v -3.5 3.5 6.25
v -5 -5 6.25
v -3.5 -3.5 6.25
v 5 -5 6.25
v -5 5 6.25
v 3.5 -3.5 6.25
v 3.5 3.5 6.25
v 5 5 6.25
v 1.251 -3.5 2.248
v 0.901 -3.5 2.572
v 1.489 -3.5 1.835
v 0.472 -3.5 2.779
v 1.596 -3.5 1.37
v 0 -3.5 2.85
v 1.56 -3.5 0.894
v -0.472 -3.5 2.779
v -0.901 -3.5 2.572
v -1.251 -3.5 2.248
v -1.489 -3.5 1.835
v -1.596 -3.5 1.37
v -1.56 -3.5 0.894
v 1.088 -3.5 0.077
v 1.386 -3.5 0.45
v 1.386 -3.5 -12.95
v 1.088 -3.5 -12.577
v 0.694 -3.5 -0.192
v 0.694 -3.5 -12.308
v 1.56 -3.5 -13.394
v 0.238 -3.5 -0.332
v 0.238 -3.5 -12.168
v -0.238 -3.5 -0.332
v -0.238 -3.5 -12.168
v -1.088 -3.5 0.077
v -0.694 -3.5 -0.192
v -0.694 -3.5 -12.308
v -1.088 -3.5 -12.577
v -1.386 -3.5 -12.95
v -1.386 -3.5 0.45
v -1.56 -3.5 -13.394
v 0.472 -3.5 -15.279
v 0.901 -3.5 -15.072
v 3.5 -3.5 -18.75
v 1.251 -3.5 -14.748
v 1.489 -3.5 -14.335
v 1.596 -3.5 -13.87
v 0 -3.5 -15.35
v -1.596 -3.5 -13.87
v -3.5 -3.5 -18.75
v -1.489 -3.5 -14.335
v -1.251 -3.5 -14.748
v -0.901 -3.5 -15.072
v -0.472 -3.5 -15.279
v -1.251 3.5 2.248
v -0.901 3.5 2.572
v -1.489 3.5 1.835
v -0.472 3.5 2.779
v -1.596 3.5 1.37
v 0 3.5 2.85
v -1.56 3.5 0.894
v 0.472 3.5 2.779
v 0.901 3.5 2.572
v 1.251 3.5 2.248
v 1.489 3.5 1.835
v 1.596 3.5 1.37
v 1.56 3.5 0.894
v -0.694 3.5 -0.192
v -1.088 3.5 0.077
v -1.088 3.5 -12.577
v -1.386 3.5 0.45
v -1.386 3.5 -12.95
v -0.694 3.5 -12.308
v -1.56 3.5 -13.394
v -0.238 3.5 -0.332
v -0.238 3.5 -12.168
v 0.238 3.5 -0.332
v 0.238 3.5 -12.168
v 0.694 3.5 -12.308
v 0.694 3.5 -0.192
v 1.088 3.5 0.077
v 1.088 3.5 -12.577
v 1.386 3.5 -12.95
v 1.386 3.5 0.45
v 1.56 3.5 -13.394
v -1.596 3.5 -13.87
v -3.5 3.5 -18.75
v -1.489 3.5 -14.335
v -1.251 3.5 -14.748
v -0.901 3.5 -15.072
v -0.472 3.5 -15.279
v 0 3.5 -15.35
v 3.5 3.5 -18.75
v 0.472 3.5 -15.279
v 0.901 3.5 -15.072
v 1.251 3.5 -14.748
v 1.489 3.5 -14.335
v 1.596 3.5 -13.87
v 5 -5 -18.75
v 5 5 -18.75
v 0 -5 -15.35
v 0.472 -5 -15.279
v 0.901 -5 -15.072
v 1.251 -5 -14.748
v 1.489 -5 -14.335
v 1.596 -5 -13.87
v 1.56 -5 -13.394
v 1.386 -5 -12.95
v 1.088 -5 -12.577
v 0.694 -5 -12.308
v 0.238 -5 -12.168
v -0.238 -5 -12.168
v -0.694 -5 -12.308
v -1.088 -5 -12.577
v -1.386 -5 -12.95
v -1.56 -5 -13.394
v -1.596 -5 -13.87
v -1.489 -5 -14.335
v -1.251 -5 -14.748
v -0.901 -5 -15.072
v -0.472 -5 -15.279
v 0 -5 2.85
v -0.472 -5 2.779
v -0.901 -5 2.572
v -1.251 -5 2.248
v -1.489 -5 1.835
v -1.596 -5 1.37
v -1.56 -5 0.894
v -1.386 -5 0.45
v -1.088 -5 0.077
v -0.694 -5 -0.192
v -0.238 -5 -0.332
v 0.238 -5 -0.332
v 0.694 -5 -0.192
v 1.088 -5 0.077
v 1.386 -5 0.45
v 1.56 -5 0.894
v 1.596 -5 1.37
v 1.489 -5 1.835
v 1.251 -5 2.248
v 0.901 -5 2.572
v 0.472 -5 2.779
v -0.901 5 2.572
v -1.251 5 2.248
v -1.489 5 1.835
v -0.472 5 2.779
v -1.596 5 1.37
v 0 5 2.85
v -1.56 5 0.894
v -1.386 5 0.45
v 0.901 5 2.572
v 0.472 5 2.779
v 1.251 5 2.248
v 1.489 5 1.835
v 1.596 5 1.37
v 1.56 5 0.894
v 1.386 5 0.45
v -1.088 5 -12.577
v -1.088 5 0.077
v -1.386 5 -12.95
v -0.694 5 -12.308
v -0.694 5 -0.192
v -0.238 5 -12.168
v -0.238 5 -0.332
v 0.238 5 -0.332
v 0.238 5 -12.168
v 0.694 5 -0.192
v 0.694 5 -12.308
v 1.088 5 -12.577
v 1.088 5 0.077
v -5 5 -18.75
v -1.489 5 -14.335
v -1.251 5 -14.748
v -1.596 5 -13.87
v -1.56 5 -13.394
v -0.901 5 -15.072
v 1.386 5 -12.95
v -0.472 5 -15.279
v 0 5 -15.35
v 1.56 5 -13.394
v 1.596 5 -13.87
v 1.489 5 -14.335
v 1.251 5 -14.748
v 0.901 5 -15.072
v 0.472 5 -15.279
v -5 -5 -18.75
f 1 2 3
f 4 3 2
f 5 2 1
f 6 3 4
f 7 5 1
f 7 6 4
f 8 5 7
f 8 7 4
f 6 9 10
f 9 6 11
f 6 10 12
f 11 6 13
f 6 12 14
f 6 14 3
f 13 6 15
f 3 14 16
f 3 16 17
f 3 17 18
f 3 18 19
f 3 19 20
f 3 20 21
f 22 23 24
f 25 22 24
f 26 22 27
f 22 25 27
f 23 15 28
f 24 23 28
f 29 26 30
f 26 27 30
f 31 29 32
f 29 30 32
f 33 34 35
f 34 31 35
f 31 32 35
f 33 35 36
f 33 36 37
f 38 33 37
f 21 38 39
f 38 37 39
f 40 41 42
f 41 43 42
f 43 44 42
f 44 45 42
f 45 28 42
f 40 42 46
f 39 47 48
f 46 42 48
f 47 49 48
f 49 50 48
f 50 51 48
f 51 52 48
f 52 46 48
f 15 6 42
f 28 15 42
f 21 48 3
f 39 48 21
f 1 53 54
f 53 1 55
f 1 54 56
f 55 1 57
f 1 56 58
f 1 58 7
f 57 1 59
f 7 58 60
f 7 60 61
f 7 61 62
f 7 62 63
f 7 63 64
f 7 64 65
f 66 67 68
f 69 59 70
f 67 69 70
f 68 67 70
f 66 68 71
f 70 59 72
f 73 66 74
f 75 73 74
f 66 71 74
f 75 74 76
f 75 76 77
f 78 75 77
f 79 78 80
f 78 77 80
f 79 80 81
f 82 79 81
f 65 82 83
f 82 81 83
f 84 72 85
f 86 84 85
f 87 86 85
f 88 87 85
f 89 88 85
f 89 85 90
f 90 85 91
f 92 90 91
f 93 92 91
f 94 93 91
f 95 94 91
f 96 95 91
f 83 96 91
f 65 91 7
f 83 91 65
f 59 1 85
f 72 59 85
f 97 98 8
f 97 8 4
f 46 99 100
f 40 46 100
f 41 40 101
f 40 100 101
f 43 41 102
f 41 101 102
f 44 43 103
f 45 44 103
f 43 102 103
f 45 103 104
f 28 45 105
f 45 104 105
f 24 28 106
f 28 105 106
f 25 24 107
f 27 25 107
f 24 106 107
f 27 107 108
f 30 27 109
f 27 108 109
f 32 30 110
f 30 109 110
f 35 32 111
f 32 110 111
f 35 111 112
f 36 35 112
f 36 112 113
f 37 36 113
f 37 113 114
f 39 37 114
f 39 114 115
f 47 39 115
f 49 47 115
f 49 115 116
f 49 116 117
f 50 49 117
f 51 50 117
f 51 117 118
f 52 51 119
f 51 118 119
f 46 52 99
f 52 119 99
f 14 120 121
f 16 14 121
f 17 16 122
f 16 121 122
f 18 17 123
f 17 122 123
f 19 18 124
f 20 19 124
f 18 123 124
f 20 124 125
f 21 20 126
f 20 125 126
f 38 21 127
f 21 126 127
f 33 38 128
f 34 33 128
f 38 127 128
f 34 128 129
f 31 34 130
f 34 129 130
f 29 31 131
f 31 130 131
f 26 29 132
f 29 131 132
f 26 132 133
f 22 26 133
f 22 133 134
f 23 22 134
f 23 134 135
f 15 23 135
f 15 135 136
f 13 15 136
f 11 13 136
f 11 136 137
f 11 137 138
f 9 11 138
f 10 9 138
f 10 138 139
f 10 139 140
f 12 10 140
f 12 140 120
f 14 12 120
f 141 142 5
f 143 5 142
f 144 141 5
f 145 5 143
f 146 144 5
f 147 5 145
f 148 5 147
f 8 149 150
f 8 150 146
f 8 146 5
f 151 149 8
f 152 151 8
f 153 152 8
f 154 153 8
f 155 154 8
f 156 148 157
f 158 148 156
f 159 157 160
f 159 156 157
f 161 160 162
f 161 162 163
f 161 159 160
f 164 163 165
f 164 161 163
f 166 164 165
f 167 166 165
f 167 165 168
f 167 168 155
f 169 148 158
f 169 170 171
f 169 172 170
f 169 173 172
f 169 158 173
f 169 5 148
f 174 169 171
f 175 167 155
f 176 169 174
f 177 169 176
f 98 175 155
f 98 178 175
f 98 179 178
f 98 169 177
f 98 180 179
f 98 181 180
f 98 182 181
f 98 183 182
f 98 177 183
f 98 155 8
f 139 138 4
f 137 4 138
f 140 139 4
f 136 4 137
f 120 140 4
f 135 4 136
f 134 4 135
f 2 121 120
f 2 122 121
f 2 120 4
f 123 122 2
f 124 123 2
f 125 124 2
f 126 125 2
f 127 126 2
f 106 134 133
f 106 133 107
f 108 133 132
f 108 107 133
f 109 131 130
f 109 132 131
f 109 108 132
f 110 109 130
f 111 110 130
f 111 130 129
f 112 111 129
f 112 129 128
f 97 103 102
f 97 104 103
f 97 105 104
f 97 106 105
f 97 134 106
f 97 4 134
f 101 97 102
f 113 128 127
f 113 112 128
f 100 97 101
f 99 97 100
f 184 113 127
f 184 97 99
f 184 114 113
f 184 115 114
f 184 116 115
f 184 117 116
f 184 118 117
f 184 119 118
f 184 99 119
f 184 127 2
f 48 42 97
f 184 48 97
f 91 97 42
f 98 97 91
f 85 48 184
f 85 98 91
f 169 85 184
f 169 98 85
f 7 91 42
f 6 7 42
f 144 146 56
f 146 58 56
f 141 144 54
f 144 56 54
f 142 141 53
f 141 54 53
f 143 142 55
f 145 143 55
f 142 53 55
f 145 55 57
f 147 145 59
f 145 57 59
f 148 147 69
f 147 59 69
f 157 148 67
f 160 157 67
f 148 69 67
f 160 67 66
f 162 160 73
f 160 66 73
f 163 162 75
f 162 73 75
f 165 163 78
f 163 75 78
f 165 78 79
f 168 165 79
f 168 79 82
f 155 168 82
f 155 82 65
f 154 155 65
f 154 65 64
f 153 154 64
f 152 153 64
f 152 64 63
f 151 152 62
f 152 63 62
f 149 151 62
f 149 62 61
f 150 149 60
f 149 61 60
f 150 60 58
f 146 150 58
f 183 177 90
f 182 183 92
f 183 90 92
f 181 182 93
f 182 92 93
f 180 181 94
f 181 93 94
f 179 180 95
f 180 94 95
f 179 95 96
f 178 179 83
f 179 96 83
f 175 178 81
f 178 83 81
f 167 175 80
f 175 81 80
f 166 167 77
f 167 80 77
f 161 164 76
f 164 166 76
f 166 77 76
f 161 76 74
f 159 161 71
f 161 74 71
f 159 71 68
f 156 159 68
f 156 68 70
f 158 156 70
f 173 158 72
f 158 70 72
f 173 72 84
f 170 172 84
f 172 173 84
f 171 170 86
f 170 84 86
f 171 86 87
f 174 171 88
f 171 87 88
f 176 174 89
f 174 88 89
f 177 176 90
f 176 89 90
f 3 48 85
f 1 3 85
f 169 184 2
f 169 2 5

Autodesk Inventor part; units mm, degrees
ref_plane "YZ Plane" through (0, 0, 0) normal (1, 0, 0) x (0, 1, 0)
ref_plane "XZ Plane" through (0, 0, 0) normal (0, 1, 0) x (-1, 0, 0)
ref_plane "XY Plane" through (0, 0, 0) normal (0, 0, 1) x (1, 0, 0)
sketch "Náčrt1" plane through (0, 0, 0) normal (0, 0, 1) x (1, 0, 0)
  line L0 (0, 7) -> (0, -7) projected
  line L1 (-7, 0) -> (7, 0) projected
  line L2 (-3.5, 3.5) -> (3.5, 3.5)
  line L3 (3.5, 3.5) -> (3.5, -3.5)
  line L4 (3.5, -3.5) -> (-3.5, -3.5)
  line L5 (-3.5, -3.5) -> (-3.5, 3.5)
  line L6 (-5, 5) -> (5, 5)
  line L7 (5, 5) -> (5, -5)
  line L8 (5, -5) -> (-5, -5)
  line L9 (-5, -5) -> (-5, 5)
  point P0 (0, 0)
  dimension "d1" = 10
  dimension "d2" = 10
  dimension "d3" = 1.5
  dimension "d4" = 1.5
  dimension "d5" = 1.5
  dimension "d6" = 1.5
extrude "Vysunutí1" add sketch "Náčrt1" along normal mid plane 12.5 contours L6 L7 L1 L3 L2 L0 | L0 L2 L5 L1 L9 L6 | L1 L5 L4 L0 L8 L9 | L7 L8 L0 L4 L3 L1
sketch "Náčrt2" plane through (-5, 5, 6.25) normal (0, 1, 0) x (1, 0, 0)
  line L0 (12, 6.25) -> (-2, 6.25) projected
  line L1 (5, 15) -> (5, -2.5) projected
  line L2 (10, 0) -> (0, 0) projected
  line L3 (0, 12.5) -> (0, 0) projected
  point P0 (5, 6.25)
  point P1 (5, 5)
  dimension "d10" = 5
  dimension "d11" = 5
hole "Díra1" at (0, 5, 1.25) direction (0, -1, 0) diameter 3.2 end through all
mirror "Zrcadlit1" about plane through (0, 0, -6.25) normal (0, 0, -1) of "Vysunutí1", "Díra1"
properties part number "bearing_standoff" material "Hliník 6061"
